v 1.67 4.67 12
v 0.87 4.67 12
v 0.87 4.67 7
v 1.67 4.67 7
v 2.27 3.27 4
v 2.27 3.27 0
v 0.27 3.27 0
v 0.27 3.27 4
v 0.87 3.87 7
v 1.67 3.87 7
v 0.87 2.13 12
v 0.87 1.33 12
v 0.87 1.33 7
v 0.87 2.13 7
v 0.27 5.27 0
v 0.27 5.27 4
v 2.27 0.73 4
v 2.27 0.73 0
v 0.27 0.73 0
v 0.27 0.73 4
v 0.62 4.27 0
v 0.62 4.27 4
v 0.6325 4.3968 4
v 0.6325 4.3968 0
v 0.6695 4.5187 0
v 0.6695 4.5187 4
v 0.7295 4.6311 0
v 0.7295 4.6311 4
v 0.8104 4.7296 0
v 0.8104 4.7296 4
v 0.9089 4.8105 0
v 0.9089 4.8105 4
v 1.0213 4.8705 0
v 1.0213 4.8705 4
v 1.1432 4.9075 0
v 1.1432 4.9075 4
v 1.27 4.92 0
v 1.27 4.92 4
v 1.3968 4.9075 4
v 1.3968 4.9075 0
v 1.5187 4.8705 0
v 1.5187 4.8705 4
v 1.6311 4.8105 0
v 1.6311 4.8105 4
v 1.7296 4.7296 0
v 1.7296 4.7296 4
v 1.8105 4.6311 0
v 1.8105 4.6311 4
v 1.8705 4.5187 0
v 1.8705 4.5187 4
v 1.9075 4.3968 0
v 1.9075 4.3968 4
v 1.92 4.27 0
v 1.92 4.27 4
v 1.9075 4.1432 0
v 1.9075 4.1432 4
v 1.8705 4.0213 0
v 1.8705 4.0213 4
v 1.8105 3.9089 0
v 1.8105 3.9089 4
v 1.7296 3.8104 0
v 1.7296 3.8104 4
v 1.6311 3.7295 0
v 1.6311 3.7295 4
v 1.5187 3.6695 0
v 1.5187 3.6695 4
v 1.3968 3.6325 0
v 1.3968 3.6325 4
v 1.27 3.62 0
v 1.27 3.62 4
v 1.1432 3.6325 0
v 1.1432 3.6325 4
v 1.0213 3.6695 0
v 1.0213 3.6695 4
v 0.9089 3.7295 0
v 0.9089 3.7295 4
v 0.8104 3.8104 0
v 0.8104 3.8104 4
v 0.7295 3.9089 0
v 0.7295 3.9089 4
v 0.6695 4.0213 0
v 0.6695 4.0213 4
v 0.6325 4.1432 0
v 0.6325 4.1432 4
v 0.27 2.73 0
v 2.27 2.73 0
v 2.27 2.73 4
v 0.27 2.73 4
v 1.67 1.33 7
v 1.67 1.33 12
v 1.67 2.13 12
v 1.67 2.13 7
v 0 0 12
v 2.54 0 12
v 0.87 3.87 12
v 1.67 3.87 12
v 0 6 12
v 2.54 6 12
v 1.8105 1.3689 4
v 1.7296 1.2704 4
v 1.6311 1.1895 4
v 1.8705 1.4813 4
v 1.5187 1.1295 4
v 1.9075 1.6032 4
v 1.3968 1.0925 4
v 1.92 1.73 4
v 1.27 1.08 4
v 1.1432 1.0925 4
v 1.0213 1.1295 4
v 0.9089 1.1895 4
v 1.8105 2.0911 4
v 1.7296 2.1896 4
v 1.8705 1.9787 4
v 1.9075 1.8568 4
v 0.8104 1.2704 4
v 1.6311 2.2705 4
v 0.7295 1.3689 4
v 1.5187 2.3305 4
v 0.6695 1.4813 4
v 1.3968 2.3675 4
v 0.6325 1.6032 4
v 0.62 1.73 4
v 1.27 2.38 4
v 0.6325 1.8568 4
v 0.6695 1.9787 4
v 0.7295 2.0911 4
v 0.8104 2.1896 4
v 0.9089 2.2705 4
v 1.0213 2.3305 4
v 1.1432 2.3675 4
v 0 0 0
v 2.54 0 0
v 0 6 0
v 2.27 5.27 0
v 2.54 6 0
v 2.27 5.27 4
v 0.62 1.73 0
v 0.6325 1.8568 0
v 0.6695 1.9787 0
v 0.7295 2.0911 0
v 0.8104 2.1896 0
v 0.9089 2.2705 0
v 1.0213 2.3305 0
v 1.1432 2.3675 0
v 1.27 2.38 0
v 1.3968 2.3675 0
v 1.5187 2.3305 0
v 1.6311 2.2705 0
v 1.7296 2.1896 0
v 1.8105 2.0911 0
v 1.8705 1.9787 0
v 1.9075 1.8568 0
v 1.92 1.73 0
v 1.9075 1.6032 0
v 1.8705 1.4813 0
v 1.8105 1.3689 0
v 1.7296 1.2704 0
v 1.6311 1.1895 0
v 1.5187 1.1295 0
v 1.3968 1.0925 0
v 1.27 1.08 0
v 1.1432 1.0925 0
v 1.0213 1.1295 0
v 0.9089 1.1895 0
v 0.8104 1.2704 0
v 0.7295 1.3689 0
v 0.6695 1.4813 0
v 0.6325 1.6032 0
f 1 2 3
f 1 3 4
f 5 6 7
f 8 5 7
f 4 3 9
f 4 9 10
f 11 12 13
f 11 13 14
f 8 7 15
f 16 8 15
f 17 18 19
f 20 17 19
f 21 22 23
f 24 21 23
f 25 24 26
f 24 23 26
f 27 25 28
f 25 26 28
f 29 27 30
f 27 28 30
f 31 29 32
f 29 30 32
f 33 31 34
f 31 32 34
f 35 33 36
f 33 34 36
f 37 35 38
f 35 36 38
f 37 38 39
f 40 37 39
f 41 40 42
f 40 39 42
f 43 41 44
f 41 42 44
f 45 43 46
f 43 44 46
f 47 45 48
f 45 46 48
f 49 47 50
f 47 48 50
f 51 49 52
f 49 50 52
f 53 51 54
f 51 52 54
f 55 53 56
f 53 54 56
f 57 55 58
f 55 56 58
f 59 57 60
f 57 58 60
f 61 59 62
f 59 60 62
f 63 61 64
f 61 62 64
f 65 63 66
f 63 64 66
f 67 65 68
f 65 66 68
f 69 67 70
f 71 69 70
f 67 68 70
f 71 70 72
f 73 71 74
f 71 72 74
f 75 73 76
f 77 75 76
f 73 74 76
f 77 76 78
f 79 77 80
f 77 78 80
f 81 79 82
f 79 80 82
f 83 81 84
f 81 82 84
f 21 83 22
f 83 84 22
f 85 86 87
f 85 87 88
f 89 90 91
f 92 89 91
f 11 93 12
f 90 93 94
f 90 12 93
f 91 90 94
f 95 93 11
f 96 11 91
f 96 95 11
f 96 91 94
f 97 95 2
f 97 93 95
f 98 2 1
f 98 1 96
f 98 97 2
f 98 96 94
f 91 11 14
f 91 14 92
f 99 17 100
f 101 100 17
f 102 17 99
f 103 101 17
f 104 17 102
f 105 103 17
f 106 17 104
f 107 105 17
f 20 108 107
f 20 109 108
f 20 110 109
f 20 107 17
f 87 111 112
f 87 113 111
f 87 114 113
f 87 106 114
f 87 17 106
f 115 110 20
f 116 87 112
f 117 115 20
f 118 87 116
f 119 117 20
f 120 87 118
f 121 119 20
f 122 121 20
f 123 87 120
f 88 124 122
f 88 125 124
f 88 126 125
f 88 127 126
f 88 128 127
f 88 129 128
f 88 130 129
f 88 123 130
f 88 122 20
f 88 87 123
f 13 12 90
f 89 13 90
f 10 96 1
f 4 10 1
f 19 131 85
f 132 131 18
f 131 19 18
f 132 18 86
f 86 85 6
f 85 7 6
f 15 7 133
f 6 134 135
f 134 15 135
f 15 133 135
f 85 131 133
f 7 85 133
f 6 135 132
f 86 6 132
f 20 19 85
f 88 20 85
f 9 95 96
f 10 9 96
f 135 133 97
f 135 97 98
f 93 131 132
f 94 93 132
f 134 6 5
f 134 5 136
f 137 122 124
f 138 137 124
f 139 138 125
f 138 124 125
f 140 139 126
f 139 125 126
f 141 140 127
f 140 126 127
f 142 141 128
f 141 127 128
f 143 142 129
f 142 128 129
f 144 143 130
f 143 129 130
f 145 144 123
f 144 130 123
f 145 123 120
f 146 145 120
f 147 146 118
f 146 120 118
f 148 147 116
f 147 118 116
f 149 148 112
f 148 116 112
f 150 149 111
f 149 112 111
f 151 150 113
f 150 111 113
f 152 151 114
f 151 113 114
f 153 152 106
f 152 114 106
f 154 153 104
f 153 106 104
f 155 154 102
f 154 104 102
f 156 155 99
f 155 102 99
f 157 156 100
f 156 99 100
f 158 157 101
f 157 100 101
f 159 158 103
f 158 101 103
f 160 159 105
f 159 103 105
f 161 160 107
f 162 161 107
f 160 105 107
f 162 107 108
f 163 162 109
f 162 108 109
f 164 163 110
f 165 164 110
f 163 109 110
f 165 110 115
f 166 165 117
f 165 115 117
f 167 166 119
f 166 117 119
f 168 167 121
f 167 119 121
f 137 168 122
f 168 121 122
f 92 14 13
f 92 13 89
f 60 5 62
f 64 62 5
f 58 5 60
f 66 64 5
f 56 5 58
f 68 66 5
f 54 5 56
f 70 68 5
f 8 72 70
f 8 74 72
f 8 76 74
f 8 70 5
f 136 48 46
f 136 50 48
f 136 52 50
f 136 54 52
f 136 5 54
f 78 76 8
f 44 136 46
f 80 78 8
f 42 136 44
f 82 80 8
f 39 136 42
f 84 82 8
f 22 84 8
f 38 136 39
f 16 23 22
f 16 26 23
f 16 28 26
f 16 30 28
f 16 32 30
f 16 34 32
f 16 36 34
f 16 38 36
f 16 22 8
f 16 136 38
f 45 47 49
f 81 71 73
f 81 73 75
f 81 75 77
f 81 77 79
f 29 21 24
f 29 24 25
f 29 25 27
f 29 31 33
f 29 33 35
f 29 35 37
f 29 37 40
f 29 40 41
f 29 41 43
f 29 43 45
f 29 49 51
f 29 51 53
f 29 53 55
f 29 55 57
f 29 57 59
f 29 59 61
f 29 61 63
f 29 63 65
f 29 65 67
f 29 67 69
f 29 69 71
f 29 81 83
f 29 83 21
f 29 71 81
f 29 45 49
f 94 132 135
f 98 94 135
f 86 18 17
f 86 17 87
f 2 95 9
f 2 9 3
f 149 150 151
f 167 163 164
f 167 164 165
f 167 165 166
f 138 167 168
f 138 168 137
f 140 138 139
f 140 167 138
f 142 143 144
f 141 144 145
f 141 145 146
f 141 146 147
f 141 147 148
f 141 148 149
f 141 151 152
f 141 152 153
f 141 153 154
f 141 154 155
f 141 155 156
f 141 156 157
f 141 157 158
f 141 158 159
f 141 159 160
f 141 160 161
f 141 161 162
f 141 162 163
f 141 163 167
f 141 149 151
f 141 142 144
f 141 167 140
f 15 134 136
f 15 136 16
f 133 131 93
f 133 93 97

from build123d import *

# Parameters (mm, degrees)
SKETCH_1_W          = 2.54
SKETCH_1_H          = 6
EXTRUDE_1_DEPTH     = 12
SKETCH_2_W          = 2
SKETCH_2_H          = 2
CUT_EXTRUDE_1_DEPTH = 4
SKETCH_3_R          = 0.65
EXTRUDE_2_DEPTH     = 4
SKETCH_4_W          = 0.8
SKETCH_4_H          = 0.8
CUT_EXTRUDE_2_DEPTH = 5


with BuildPart() as part:
    # Эскиз1 → Бобышка-Вытянуть1 (new body)
    with BuildSketch(Plane.XY):
        with Locations((1.27, 3)):
            Rectangle(SKETCH_1_W, SKETCH_1_H)
    extrude(amount=EXTRUDE_1_DEPTH)

    # Эскиз2 → Вырез-Вытянуть1 (cut)
    with BuildSketch(Plane(origin=(0, 0, 0), x_dir=(-1, 0, 0), z_dir=(0, 0, -1))):
        with Locations((-1.27, 4.27)):
            Rectangle(SKETCH_2_W, SKETCH_2_H)
        with Locations((-1.27, 1.73)):
            Rectangle(SKETCH_2_W, SKETCH_2_H)
    extrude(amount=-CUT_EXTRUDE_1_DEPTH, mode=Mode.SUBTRACT)

    # Эскиз3 → Бобышка-Вытянуть2 (add)
    with BuildSketch(Plane(origin=(0, 0, 4), x_dir=(-1, 0, 0), z_dir=(0, 0, -1))):
        with Locations((-1.27, 4.27)):
            Circle(SKETCH_3_R)
        with Locations((-1.27, 1.73)):
            Circle(SKETCH_3_R)
    extrude(amount=EXTRUDE_2_DEPTH)

    # Эскиз4 → Вырез-Вытянуть2 (cut)
    with BuildSketch(Plane.XY.offset(12)):
        with Locations((1.27, 4.27)):
            Rectangle(SKETCH_4_W, SKETCH_4_H)
        with Locations((1.27, 1.73)):
            Rectangle(SKETCH_4_W, SKETCH_4_H)
    extrude(amount=-CUT_EXTRUDE_2_DEPTH, mode=Mode.SUBTRACT)


solid = part.part
